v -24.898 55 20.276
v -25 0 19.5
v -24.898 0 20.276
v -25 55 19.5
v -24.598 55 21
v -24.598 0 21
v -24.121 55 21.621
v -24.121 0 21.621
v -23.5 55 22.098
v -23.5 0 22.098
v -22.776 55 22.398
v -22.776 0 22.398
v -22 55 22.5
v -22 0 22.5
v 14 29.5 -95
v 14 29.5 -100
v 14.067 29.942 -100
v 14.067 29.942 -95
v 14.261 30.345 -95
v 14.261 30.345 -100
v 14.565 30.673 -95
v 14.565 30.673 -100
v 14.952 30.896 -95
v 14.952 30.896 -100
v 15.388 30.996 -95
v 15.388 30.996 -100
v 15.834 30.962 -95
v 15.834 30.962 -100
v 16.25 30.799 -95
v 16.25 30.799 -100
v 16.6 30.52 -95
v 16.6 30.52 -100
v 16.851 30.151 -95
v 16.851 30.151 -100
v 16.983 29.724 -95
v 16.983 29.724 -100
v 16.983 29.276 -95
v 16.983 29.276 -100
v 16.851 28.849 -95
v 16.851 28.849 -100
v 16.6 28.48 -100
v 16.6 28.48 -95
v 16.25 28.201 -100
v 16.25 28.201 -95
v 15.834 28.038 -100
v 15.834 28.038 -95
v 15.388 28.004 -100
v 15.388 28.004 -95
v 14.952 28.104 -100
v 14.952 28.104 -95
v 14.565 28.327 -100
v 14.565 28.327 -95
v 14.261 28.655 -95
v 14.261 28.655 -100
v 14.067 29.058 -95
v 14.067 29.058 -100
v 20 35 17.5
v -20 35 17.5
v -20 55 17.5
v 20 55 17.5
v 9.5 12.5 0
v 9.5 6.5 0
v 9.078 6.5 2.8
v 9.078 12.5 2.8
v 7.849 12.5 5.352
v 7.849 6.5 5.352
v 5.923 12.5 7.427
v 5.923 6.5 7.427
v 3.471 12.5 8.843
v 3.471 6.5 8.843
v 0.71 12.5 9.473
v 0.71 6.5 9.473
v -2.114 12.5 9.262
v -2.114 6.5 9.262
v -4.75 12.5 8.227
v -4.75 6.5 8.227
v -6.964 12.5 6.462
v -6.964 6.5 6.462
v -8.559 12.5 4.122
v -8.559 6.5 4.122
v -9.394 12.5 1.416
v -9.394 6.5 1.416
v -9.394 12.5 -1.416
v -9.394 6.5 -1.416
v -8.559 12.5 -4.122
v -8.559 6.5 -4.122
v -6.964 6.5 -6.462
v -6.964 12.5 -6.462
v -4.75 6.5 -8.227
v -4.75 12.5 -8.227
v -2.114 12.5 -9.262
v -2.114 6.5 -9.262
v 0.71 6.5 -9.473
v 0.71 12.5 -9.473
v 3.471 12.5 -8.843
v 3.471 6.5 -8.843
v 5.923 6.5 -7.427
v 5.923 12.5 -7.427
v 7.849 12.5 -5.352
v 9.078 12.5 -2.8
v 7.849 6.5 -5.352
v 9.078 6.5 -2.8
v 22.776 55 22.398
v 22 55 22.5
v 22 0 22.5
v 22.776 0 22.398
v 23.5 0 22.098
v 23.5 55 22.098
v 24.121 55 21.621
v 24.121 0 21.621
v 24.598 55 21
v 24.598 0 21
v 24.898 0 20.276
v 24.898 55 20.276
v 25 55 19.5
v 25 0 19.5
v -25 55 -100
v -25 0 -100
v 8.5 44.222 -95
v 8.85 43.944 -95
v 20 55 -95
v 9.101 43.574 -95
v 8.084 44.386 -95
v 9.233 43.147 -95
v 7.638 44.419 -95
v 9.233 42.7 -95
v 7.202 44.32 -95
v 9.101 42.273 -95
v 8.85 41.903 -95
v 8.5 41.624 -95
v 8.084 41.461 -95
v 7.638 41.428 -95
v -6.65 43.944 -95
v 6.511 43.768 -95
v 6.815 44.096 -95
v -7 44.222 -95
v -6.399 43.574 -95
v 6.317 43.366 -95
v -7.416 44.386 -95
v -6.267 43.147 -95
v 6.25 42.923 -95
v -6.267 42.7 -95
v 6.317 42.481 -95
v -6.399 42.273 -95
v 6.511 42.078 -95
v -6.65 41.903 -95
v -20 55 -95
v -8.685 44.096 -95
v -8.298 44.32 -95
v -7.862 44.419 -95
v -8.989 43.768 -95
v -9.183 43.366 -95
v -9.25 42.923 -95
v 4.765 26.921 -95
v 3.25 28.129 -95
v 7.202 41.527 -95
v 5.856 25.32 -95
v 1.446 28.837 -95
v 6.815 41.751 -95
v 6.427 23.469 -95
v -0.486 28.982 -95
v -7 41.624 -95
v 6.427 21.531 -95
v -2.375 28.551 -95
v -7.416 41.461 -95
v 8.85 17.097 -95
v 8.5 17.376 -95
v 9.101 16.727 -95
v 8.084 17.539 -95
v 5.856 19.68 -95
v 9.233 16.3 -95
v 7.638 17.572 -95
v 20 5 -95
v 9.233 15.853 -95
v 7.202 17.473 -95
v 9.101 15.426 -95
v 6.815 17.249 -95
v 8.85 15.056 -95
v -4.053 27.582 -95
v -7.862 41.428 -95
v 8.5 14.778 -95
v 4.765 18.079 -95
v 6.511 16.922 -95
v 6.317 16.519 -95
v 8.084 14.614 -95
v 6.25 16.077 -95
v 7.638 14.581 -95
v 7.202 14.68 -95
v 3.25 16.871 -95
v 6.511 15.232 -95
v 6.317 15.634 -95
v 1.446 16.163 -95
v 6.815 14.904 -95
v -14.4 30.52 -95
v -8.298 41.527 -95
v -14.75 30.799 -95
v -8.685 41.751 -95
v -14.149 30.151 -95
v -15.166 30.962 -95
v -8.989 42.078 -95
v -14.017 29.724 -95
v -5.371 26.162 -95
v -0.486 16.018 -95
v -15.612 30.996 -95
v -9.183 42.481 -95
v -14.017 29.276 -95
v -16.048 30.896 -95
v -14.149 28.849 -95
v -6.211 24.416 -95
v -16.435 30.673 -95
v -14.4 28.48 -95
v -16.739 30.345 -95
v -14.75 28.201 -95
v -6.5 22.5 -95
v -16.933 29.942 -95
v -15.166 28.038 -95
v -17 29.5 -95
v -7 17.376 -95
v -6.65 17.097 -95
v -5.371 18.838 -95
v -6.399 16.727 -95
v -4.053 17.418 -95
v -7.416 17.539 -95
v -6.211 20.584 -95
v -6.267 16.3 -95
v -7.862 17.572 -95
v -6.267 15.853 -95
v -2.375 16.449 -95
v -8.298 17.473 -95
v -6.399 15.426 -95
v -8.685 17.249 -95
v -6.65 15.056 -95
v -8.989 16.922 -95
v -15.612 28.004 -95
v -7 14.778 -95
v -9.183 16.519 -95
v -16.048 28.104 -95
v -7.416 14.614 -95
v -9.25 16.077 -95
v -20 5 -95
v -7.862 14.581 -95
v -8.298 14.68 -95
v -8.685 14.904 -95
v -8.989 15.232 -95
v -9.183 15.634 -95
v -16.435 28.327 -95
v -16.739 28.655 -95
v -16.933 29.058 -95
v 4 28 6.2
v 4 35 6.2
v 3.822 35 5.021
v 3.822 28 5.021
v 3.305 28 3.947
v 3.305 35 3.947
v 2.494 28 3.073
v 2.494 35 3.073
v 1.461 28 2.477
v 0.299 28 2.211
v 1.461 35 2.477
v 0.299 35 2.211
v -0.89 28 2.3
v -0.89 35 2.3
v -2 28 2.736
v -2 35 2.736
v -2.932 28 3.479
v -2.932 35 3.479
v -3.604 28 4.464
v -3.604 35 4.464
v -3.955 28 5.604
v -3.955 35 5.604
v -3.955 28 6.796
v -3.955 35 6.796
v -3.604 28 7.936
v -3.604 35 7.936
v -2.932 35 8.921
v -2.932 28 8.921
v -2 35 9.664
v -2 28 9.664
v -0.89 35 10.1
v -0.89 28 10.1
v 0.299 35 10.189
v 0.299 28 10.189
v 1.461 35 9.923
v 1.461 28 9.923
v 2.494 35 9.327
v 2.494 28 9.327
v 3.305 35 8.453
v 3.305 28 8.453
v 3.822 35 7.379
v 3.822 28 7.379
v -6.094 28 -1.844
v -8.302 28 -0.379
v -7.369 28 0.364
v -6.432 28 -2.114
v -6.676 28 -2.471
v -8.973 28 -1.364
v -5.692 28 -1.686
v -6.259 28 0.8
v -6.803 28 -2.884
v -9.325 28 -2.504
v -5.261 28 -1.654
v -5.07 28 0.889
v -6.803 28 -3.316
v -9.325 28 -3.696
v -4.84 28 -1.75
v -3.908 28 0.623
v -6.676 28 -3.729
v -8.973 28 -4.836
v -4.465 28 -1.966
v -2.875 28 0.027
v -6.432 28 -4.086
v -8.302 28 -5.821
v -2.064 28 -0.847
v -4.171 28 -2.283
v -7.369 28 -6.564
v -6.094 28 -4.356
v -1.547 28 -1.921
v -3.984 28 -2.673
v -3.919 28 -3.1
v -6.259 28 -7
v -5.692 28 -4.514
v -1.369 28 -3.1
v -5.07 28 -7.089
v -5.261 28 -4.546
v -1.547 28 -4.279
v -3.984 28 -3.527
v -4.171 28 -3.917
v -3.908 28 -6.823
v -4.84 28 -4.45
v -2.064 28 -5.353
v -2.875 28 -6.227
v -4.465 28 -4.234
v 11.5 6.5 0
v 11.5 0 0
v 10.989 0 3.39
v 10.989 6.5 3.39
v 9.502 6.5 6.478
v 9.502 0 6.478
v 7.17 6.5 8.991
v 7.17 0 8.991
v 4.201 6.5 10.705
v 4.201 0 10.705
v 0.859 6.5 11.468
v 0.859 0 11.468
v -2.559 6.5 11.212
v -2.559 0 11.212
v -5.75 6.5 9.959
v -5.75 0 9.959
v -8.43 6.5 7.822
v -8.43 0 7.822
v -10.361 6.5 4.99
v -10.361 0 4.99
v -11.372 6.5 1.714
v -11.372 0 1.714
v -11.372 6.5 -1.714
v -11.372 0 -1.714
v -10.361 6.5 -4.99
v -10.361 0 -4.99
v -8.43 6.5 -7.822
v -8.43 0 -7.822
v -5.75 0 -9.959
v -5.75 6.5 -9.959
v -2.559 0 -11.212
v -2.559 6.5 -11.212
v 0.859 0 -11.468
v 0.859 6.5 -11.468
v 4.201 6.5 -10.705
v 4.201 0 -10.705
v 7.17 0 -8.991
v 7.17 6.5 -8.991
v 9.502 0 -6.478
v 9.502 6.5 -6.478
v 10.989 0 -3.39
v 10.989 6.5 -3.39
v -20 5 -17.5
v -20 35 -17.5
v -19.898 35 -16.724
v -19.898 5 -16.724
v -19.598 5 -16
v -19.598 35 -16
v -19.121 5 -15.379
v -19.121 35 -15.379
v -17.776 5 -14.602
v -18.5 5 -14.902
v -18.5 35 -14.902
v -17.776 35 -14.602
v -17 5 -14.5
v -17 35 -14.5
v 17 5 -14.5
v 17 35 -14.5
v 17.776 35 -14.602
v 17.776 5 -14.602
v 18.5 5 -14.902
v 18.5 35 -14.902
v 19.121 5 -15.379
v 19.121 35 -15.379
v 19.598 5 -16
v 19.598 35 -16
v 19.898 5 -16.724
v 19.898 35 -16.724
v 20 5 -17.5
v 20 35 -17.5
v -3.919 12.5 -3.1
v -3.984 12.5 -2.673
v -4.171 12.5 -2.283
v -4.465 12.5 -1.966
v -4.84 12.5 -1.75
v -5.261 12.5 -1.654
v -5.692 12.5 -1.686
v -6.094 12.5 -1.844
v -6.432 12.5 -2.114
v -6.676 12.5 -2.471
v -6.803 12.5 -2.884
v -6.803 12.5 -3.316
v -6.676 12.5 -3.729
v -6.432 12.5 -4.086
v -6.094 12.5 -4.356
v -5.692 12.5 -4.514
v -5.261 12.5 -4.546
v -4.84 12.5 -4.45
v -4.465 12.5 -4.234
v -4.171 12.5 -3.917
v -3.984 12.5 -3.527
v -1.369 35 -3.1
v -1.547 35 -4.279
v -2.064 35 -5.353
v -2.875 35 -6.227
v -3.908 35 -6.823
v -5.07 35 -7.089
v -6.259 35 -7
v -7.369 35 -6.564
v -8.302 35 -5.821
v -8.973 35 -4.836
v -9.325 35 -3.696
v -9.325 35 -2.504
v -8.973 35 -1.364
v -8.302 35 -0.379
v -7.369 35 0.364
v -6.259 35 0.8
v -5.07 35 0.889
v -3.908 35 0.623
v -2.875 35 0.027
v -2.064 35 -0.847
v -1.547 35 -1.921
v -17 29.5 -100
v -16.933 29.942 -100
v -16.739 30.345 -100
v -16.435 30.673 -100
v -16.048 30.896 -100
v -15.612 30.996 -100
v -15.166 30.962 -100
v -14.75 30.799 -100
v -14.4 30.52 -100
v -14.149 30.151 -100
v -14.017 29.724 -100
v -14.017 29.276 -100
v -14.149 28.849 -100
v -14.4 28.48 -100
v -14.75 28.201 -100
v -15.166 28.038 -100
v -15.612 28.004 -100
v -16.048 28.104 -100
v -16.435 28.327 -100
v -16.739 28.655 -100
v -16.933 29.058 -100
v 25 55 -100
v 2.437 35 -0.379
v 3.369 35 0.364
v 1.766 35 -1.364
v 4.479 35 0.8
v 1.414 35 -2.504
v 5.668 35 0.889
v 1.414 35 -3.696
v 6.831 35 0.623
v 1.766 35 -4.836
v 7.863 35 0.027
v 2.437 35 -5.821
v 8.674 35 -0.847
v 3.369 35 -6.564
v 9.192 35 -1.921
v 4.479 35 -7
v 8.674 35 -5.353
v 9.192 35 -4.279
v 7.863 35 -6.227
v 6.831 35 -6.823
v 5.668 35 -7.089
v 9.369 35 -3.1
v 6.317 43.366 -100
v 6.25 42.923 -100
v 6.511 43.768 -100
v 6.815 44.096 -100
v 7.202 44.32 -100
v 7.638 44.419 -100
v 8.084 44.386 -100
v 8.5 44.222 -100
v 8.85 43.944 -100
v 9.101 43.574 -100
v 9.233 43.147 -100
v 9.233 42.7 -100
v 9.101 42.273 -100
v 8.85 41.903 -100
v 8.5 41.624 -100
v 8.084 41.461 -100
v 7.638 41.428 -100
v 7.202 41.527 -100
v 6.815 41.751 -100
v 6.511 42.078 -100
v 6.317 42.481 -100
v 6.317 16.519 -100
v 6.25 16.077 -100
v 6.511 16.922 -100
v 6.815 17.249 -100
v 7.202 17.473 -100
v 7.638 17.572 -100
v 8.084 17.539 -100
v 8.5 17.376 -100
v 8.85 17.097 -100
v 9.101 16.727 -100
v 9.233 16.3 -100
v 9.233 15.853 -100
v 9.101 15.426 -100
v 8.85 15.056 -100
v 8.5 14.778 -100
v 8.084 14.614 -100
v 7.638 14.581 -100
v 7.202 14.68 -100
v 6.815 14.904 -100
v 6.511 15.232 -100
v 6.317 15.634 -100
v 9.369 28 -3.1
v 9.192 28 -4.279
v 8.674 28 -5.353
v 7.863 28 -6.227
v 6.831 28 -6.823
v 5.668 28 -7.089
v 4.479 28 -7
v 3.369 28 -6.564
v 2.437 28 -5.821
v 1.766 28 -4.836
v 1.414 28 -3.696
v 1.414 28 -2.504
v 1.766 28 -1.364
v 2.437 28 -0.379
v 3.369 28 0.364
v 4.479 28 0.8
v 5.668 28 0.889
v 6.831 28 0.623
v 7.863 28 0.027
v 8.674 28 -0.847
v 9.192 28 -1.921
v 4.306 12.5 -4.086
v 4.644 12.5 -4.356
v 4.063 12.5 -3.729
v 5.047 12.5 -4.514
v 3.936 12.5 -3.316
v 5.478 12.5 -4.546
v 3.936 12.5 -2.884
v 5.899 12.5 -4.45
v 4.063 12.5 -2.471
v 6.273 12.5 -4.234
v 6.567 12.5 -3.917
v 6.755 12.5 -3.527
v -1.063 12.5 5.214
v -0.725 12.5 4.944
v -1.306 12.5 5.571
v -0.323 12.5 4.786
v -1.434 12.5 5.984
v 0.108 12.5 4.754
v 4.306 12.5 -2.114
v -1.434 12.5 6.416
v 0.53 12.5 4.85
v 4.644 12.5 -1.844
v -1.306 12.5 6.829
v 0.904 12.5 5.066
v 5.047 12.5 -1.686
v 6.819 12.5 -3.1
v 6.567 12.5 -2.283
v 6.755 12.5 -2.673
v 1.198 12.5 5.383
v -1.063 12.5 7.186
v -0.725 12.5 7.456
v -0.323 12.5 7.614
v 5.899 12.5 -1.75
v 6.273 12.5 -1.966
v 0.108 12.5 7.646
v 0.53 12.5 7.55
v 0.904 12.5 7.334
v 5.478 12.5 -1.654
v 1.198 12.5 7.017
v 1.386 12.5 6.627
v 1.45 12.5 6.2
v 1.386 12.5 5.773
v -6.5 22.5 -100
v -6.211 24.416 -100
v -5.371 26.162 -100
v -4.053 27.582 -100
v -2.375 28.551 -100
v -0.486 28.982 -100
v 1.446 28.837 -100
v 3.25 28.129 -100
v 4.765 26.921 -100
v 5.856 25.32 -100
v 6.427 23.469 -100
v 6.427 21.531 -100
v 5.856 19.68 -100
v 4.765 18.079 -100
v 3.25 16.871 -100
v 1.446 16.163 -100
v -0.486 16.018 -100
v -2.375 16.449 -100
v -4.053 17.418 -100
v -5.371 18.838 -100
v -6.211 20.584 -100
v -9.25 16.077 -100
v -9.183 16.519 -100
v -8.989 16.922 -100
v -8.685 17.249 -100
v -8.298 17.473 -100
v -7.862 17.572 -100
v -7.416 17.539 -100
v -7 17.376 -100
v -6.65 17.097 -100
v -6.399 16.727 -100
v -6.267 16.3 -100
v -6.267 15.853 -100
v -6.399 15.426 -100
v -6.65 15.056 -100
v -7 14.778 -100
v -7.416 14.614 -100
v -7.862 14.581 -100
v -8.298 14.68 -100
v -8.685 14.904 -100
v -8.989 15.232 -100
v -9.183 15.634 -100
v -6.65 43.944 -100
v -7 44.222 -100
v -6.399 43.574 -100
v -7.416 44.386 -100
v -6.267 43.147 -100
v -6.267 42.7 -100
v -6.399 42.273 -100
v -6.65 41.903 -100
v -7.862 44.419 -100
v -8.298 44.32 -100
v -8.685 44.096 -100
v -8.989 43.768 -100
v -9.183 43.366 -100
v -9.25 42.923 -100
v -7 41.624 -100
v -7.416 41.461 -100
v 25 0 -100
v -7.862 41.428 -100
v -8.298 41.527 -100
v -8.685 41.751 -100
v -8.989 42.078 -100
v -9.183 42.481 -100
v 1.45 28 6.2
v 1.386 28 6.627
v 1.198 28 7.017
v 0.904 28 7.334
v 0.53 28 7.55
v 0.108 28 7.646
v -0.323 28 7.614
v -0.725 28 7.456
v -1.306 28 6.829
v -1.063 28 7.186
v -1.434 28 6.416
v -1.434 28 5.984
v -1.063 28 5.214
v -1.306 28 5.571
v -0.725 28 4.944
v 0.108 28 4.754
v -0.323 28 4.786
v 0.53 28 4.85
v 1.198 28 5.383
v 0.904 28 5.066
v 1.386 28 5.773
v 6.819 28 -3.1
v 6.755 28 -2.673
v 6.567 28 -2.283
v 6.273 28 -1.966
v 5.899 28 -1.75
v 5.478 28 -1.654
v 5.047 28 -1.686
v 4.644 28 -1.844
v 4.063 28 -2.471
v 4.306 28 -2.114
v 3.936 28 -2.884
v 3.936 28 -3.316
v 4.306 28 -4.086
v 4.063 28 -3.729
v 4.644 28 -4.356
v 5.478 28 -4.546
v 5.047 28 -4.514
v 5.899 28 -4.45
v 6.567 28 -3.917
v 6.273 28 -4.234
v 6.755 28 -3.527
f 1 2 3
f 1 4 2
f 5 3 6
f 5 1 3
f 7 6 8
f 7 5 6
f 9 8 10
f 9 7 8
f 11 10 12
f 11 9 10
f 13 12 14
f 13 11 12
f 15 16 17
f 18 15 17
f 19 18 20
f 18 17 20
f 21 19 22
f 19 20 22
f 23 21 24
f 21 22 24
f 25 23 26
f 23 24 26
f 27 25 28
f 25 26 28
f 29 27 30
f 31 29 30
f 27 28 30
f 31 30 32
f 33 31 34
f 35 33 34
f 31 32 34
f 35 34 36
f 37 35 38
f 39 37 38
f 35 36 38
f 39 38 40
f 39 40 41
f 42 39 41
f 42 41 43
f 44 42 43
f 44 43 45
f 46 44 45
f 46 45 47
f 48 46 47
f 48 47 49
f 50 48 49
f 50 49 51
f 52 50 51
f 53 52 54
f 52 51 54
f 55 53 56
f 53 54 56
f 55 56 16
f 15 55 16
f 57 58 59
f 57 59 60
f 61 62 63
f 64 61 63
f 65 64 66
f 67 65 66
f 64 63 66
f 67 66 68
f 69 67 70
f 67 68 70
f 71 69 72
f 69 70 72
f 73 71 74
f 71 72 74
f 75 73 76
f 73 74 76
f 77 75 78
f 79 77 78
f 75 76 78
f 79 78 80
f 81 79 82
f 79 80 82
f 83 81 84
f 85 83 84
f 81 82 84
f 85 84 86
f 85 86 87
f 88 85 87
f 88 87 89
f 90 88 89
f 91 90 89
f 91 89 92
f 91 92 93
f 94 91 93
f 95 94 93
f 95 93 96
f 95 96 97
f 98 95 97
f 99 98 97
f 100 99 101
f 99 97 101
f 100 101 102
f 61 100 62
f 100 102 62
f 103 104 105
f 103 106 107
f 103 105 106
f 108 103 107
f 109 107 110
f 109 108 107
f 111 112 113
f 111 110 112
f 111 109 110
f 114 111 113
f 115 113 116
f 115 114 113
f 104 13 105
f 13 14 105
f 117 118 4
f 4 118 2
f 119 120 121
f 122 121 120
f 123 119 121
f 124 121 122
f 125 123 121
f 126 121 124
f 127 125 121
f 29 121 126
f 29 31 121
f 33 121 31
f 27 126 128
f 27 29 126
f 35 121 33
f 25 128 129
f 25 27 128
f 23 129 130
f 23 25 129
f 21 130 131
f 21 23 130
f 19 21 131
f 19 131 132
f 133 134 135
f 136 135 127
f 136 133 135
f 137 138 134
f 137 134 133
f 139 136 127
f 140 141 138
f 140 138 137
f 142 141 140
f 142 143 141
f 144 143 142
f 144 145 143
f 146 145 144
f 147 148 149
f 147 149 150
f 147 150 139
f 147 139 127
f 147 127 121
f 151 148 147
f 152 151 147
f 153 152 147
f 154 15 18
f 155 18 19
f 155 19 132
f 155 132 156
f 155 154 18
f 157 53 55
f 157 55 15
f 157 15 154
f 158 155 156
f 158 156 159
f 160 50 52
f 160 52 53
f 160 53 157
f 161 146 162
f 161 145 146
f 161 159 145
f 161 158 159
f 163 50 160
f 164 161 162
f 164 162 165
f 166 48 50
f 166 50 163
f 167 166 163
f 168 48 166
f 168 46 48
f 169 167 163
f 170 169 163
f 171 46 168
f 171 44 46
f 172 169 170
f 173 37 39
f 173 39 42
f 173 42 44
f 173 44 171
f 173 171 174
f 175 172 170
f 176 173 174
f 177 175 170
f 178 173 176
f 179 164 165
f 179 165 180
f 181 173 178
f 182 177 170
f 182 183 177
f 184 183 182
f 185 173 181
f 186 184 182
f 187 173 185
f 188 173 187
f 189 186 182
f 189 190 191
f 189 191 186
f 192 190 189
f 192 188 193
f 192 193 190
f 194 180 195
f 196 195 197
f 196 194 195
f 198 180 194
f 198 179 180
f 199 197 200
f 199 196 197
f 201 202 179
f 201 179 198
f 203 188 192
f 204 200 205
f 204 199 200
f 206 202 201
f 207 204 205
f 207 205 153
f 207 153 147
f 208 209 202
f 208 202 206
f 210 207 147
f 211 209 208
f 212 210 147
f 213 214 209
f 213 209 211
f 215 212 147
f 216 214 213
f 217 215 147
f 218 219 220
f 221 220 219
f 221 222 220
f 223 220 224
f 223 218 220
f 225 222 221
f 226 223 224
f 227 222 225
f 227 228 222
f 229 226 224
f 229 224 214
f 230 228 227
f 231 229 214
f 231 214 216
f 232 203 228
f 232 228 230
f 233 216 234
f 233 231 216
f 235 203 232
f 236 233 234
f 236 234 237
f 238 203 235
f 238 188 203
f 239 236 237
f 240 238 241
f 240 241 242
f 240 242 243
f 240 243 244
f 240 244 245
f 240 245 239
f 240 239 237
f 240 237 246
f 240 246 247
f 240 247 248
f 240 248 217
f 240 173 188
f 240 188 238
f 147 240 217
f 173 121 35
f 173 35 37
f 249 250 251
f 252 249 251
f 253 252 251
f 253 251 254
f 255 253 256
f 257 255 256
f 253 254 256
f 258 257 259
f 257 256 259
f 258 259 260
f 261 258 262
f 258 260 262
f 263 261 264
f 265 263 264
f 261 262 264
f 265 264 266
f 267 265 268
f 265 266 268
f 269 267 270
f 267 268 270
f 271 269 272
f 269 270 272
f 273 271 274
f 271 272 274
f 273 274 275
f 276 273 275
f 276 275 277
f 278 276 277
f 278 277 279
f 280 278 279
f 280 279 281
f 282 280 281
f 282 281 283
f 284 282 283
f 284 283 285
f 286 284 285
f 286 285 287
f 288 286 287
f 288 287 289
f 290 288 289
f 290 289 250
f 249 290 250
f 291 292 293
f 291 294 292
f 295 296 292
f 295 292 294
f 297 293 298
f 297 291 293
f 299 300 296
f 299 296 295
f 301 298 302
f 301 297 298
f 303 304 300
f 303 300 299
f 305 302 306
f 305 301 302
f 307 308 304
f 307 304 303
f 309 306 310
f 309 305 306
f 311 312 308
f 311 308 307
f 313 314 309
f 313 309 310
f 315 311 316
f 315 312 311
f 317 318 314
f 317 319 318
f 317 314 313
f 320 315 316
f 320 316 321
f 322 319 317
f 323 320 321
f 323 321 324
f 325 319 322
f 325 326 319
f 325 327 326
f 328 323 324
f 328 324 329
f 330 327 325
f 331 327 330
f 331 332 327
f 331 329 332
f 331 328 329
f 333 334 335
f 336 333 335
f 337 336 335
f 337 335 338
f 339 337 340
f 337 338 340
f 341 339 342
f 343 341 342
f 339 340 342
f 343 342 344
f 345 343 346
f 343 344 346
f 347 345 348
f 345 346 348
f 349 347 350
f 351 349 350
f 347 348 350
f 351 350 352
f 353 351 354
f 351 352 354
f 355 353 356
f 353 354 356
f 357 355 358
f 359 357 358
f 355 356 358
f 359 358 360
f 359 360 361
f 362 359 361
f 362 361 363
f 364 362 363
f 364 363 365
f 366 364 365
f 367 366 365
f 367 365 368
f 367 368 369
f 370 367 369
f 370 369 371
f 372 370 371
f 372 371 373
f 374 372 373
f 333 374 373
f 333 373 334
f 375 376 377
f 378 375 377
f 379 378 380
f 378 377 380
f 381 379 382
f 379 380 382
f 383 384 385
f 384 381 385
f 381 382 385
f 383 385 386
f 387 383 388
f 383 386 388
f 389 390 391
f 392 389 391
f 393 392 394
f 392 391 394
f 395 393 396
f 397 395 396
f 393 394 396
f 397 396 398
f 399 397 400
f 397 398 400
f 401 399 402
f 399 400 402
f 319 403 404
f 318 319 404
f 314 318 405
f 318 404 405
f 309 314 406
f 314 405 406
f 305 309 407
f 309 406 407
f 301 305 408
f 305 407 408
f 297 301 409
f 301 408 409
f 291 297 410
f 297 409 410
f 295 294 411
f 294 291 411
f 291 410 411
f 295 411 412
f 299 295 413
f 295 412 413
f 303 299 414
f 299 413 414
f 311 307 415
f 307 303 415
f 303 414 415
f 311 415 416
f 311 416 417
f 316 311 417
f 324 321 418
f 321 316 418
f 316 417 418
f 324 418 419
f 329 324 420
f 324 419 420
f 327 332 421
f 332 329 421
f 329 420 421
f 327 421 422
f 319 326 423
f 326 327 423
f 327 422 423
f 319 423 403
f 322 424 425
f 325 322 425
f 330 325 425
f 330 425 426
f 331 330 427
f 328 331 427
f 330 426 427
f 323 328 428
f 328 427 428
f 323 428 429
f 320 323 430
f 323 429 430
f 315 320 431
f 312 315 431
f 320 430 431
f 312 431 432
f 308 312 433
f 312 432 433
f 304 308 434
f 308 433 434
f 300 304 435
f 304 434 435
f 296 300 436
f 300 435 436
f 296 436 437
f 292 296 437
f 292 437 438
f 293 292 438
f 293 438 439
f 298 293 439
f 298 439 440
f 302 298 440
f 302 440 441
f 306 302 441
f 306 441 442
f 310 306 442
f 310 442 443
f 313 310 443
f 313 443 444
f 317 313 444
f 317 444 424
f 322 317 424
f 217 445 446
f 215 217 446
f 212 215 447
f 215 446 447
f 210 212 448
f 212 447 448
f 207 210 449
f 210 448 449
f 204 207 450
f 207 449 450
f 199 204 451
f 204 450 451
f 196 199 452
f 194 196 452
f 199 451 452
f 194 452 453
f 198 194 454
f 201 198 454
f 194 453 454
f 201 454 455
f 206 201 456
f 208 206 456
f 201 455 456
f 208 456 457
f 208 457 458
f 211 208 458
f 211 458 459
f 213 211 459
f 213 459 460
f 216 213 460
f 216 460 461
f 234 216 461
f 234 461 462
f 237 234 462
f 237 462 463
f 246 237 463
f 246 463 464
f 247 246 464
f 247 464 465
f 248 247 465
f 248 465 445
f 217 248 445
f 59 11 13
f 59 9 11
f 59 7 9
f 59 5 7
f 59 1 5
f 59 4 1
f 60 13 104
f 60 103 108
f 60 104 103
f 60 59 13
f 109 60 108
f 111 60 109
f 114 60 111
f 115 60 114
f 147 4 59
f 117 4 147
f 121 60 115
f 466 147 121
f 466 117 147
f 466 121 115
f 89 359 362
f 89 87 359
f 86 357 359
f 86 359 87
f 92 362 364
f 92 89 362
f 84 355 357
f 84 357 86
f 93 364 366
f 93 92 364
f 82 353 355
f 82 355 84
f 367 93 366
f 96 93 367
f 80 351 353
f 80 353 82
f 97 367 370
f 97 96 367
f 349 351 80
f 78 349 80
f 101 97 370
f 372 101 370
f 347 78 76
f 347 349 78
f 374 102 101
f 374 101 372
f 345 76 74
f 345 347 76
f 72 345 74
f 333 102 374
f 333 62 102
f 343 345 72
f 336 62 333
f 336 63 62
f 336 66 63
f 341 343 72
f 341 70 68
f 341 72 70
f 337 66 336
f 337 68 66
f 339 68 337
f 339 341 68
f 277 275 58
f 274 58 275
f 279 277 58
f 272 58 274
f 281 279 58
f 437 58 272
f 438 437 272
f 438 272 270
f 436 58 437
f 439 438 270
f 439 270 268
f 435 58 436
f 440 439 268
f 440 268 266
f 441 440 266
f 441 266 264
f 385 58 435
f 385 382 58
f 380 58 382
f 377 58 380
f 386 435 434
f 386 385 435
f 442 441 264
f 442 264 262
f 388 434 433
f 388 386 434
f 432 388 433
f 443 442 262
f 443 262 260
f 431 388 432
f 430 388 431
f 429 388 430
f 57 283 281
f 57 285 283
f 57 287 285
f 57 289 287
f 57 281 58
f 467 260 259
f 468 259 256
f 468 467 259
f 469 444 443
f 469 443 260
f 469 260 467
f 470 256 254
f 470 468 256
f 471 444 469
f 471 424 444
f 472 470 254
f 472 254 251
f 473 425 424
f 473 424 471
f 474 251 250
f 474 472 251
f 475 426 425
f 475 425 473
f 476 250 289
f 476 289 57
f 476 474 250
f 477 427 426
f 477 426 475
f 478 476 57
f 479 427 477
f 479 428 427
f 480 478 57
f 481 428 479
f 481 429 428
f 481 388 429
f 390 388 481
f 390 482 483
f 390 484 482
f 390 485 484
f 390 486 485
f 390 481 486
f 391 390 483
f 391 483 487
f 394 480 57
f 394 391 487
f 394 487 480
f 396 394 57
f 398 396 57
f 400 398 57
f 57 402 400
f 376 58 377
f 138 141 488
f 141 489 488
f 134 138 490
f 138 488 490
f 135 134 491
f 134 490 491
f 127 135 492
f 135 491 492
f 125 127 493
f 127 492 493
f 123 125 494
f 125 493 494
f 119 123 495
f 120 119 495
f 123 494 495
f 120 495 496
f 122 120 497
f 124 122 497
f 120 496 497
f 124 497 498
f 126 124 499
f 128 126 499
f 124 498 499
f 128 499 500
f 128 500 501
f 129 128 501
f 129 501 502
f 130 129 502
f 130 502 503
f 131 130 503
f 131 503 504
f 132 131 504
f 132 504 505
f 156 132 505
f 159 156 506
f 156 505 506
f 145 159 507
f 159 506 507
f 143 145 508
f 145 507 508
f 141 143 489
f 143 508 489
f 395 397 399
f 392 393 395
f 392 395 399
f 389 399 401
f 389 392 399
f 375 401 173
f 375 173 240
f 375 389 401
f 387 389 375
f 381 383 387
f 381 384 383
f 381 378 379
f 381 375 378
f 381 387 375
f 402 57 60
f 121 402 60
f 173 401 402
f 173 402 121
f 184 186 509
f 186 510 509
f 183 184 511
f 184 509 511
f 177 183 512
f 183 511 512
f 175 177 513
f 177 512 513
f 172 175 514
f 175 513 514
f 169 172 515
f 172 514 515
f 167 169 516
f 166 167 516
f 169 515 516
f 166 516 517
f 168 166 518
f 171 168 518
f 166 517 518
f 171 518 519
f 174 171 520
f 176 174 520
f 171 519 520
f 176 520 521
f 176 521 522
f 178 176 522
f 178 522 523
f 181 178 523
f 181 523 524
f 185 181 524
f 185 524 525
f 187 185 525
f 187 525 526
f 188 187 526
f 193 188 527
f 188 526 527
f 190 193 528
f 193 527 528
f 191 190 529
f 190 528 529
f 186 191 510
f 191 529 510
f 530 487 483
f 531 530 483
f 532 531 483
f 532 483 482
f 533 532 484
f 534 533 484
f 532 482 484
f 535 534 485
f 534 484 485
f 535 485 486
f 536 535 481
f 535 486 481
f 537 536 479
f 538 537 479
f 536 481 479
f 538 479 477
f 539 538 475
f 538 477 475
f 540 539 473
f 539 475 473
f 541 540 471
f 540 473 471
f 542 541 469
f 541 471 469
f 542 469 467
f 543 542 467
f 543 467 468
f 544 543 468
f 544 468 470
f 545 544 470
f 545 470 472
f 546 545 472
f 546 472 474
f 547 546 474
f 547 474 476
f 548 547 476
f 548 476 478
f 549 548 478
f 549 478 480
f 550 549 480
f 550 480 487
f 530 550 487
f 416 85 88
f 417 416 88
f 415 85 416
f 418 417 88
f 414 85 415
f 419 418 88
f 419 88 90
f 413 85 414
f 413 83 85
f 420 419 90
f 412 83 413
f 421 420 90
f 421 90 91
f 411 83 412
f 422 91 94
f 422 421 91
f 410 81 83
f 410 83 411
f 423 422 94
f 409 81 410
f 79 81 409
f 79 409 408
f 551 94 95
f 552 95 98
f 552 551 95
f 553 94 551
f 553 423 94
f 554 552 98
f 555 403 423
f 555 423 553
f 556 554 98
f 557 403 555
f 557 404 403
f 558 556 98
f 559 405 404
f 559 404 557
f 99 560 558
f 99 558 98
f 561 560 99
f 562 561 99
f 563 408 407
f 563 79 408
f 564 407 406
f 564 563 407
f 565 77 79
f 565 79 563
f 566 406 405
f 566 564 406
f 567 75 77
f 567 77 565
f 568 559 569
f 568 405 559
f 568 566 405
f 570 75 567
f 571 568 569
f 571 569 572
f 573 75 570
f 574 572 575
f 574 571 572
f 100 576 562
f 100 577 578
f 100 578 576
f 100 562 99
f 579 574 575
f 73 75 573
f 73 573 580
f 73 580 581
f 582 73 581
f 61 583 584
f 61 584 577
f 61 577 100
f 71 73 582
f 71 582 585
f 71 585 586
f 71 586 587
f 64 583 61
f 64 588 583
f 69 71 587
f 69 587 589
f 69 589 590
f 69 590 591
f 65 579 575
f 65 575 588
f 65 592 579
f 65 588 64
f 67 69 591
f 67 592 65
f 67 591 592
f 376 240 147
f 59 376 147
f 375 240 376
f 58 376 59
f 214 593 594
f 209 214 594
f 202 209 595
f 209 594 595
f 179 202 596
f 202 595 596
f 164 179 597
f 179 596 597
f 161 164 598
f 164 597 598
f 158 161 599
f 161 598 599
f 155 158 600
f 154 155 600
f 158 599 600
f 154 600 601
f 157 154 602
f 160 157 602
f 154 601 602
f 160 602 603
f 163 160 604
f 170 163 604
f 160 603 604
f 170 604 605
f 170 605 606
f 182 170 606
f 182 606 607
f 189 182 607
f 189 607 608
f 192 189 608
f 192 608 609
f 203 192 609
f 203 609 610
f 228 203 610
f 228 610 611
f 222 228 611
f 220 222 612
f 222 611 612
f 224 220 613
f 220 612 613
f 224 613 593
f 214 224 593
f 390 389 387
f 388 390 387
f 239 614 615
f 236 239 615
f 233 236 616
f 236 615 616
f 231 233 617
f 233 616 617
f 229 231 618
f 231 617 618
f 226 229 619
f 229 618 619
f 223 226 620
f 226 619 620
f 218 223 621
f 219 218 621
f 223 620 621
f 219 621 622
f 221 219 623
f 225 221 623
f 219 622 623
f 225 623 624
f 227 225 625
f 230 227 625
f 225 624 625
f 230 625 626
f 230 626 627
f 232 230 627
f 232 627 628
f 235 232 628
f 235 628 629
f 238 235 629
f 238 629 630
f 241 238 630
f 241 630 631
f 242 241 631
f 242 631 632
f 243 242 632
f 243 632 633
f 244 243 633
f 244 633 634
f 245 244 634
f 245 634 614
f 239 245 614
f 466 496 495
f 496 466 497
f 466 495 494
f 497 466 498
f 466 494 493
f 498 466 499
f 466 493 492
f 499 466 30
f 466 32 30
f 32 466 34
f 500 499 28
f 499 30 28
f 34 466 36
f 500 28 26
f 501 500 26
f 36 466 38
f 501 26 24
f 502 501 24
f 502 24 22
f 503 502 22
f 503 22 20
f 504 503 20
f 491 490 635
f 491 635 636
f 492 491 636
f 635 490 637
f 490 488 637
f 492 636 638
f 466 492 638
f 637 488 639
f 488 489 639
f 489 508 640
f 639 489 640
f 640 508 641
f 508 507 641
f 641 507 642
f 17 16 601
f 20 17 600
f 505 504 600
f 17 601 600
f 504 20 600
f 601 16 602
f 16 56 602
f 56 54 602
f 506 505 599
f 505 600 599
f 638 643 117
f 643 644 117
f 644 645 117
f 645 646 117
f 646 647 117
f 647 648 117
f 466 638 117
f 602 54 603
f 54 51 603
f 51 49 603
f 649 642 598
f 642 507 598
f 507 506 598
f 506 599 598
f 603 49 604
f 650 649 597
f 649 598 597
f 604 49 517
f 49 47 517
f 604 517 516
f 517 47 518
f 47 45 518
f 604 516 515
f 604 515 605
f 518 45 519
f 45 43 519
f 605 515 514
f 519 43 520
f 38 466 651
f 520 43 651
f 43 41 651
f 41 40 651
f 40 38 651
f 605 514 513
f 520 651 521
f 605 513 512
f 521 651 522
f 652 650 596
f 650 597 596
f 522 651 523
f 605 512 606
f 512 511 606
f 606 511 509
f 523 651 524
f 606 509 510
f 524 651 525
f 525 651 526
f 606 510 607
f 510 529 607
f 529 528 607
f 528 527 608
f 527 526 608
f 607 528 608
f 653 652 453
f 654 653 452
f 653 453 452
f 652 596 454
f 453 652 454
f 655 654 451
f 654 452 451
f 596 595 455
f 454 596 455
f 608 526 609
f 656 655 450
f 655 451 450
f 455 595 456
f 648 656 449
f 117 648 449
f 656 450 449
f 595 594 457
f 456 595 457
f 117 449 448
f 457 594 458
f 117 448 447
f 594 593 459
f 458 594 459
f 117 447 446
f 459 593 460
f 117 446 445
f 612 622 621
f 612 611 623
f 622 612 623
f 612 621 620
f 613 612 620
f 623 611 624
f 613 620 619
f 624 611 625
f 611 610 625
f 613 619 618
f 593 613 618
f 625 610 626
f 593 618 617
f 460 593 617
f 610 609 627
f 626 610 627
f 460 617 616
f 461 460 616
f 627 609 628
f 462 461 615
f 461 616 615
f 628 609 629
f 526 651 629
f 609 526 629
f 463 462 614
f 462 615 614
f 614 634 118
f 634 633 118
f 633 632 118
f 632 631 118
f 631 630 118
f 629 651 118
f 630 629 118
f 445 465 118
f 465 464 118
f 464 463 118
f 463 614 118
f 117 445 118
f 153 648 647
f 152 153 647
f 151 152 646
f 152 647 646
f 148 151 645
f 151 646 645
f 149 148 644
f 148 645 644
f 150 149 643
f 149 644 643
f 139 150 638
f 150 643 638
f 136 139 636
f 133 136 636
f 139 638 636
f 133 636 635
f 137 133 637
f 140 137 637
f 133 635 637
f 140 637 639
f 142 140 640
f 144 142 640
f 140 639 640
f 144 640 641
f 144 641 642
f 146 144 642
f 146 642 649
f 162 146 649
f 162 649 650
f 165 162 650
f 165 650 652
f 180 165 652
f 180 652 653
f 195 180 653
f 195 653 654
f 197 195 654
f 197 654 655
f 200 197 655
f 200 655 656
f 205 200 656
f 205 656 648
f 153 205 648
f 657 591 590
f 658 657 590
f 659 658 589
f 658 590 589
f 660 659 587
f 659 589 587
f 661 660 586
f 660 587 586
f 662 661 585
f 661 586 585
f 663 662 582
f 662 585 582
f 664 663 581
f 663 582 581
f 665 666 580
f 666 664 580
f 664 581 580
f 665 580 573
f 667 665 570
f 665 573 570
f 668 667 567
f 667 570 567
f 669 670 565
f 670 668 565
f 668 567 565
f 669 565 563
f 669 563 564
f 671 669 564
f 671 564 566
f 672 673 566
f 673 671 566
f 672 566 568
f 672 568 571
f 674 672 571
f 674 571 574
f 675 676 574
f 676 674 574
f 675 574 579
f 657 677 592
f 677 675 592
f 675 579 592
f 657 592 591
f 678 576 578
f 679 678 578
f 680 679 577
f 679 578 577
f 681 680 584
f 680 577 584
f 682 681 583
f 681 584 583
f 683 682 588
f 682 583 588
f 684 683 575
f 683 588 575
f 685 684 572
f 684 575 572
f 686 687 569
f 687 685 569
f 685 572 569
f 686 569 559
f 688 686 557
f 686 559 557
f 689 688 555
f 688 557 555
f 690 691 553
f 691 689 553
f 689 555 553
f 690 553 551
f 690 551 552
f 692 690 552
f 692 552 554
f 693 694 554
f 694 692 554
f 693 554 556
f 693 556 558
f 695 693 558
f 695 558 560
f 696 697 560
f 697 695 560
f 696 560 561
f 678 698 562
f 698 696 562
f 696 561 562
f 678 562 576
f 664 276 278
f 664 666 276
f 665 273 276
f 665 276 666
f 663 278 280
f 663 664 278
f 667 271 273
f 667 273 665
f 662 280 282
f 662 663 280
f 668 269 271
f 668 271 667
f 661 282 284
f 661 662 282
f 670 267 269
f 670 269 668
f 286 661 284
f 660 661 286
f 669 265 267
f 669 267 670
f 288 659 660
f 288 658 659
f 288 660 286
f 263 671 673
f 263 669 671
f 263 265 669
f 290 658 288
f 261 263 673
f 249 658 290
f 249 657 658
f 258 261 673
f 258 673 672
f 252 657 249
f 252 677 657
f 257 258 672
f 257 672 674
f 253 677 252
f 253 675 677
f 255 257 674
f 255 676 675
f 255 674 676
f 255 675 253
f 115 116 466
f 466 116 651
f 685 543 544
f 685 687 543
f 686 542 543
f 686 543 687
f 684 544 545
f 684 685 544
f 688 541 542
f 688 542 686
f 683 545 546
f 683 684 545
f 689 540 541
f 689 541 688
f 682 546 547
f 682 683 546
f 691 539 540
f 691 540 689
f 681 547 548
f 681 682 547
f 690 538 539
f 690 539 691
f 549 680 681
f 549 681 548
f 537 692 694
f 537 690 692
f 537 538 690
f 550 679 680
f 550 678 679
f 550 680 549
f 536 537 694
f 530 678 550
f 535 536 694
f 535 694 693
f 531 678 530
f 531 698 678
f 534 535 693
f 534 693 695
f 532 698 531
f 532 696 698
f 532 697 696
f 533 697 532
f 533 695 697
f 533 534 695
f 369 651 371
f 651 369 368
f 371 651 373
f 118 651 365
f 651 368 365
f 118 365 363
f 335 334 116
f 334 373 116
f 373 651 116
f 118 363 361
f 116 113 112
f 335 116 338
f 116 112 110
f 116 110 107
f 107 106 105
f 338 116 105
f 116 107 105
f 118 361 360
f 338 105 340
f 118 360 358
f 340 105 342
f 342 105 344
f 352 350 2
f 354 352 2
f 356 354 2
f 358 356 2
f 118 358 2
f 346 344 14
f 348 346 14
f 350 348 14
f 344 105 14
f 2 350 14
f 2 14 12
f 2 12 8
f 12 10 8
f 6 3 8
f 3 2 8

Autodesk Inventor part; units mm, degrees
ref_plane "YZ Plane" through (0, 0, 0) normal (1, 0, 0) x (0, 1, 0)
ref_plane "XZ Plane" through (0, 0, 0) normal (0, 1, 0) x (-1, 0, 0)
ref_plane "XY Plane" through (0, 0, 0) normal (0, 0, 1) x (1, 0, 0)
sketch "Sketch1" plane through (0, 0, 0) normal (0, 1, 0) x (-1, 0, 0)
  line L0 (25, 22.5) -> (-25, 22.5)
  line L1 (-25, 22.5) -> (-25, -100)
  line L2 (-25, -100) -> (25, -100)
  line L3 (25, -100) -> (25, 22.5)
  circle A0 centre (0, 0) radius 4
  dimension "d0" = 50
  dimension "d1" = 22.5
  dimension "d2" = 25
  dimension "d3" = 122.5
  dimension "d4" = 8
extrude "Extrusion1" add sketch "Sketch1" along normal blind 5
sketch "Sketch2" plane through (0, 5, 0) normal (0, 1, 0) x (1, 0, 0)
  line L0 (-25, 100) -> (-25, -22.5) projected
  line L1 (25, -22.5) -> (25, 100) projected
  line L2 (-25, -22.5) -> (25, -22.5)
  line L3 (25, -22.5) -> (25, 100)
  line L4 (25, 100) -> (-25, 100)
  line L5 (-25, 100) -> (-25, -22.5)
  line L6 (-20, -17.5) -> (20, -17.5)
  line L7 (20, -17.5) -> (20, 95)
  line L8 (20, 95) -> (-20, 95)
  line L9 (-20, 95) -> (-20, -17.5)
  point P0 (0, 0)
  dimension "d7" = 5
  dimension "d8" = 5
  dimension "d9" = 5
  dimension "d10" = 5
extrude "Extrusion2" add sketch "Sketch2" along normal blind 50
sketch "Sketch3" plane through (0, 5, 0) normal (0, 1, 0) x (1, 0, 0)
  line L0 (-20, 95) -> (-20, -17.5) projected
  line L1 (20, -17.5) -> (20, 95) projected
  line L2 (-20, -17.5) -> (20, -17.5)
  line L3 (20, -17.5) -> (20, 14.5)
  line L4 (20, 14.5) -> (-20, 14.5)
  line L5 (-20, 14.5) -> (-20, -17.5)
  point P0 (0, 0)
  dimension "d13" = 32
extrude "Extrusion3" add sketch "Sketch3" along normal blind 30
sketch "Sketch4" plane through (25, 0, -100) normal (0, 0, -1) x (-1, 0, 0)
  circle A0 centre (25, 22.5) radius 6.5
  line L0 (0, 0) -> (50, 0) projected
  line L1 (50, 0) -> (50, 55) projected
  circle A1 centre (25, 29.5) radius 15.5
  line L2 (25, 29.5) -> (45.4383, 29.5)
  line L3 (45.4383, 29.5) -> (2.3057, 29.5)
  line L4 (25, 29.5) -> (33.9734, 13.9576)
  line L5 (25, 29.5) -> (15.8246, 13.6078)
  line L6 (25, 29.5) -> (33.427, 44.096)
  line L7 (25, 29.5) -> (15.5571, 45.8556)
  circle A2 centre (40.5, 29.5) radius 1.5
  circle A3 centre (32.75, 42.9234) radius 1.5
  circle A4 centre (17.25, 42.9234) radius 1.5
  circle A5 centre (9.5, 29.5) radius 1.5
  circle A6 centre (17.25, 16.0766) radius 1.5
  circle A7 centre (32.75, 16.0766) radius 1.5
  point P0 (25, 0)
  dimension "d16" = 22.5
  dimension "d17" = 13
  dimension "d18" = 25
  dimension "d19" = 7
  dimension "d20" = 31
  dimension "d21" = 60
  dimension "d22" = 60
  dimension "d23" = 60
  dimension "d24" = 60
  dimension "d25" = 25
  dimension "d26" = 3
  dimension "d27" = 3
  dimension "d28" = 3
  dimension "d29" = 3
  dimension "d30" = 3
  dimension "d31" = 3
extrude "Extrusion4" cut sketch "Sketch4" against normal blind 30 contours A0 L4 | L4 A0 L5 | L5 A0 | A7 A1 L4 | L4 A1 A7 | A2 A1 L2 | L2 A1 A2 | A5 A1 L3 | L3 A1 A5 | A3 A1 L6 | L6 A1 A3 | A4 A1 L7 | L7 A1 A4 | A6 A1 L5 | L5 A1 A6 | L4 A7 A1 | A1 A7 L4 | L2 A2 A1 | A1 A2 L2 | L3 A5 A1 | A1 A5 L3 | A1 A3 | L7 A4 A1 | A1 A4 L7 | L5 A6 A1 | A1 A6 L5 picked at (24.9025, 21.8029)
sketch "Sketch5" plane through (0, 0, 0) normal (0, -1, 0) x (1, 0, 0)
  circle A0 centre (0, 0) radius 4 projected
  circle A1 centre (0, 0) radius 9.5
  dimension "d34" = 19
extrude "Extrusion5" cut sketch "Sketch5" against normal blind 12.5 contours A0 | A1
sketch "Sketch6" plane through (0, 0, 0) normal (0, -1, 0) x (1, 0, 0)
  circle A0 centre (0, 0) radius 9.5 projected
  circle A1 centre (0, 0) radius 11.5
  dimension "d37" = 23
extrude "Extrusion6" cut sketch "Sketch6" against normal blind 6.5 contours A0 | A1
sketch "Sketch7" plane through (0, 12.5, 0) normal (0, -1, 0) x (1, 0, 0)
  circle A0 centre (0, 0) radius 9.5 projected
  circle A1 centre (0, 0) radius 6.2
  line L0 (0, 0) -> (0, 7.2993)
  line L1 (0, 0) -> (-6.3974, -3.6935)
  line L2 (0, 0) -> (6.4992, -3.7523)
  circle A2 centre (5.3694, -3.1) radius 1.45
  circle A3 centre (-5.3694, -3.1) radius 1.45
  circle A4 centre (0, 6.2) radius 1.45
  dimension "d40" = 12.4
  dimension "d41" = 120
  dimension "d42" = 120
  dimension "d43" = 2.9
  dimension "d44" = 2.9
  dimension "d45" = 2.9
extrude "Extrusion7" cut sketch "Sketch7" against normal blind 30 contours A4 L0 A1 | A1 A4 | A2 A1 | A1 L2 A2 | L0 A4 A1 | A1 A2 L2 | A3 L1 A1 | A1 A3 | A3 A1 L1
fillet "Fillet1" radius 3 4 edges at (20, 20, -14.5) (-20, 20, -14.5) (25, 27.5, 22.5) (-25, 27.5, 22.5)
sketch "Sketch8" plane through (0, 35, 0) normal (0, 1, 0) x (1, 0, 0)
  circle A0 centre (-5.3694, 3.1) radius 1.45 projected
  circle A1 centre (-5.3694, 3.1) radius 4
  circle A2 centre (5.3694, 3.1) radius 1.45 projected
  circle A3 centre (5.3694, 3.1) radius 4
  circle A4 centre (0, -6.2) radius 1.45 projected
  circle A5 centre (0, -6.2) radius 4
  point P0 (0, 0)
  dimension "d49" = 8
  dimension "d50" = 8
  dimension "d51" = 8
extrude "Extrusion8" cut sketch "Sketch8" against normal blind 7
properties part number "Link3_v2"
